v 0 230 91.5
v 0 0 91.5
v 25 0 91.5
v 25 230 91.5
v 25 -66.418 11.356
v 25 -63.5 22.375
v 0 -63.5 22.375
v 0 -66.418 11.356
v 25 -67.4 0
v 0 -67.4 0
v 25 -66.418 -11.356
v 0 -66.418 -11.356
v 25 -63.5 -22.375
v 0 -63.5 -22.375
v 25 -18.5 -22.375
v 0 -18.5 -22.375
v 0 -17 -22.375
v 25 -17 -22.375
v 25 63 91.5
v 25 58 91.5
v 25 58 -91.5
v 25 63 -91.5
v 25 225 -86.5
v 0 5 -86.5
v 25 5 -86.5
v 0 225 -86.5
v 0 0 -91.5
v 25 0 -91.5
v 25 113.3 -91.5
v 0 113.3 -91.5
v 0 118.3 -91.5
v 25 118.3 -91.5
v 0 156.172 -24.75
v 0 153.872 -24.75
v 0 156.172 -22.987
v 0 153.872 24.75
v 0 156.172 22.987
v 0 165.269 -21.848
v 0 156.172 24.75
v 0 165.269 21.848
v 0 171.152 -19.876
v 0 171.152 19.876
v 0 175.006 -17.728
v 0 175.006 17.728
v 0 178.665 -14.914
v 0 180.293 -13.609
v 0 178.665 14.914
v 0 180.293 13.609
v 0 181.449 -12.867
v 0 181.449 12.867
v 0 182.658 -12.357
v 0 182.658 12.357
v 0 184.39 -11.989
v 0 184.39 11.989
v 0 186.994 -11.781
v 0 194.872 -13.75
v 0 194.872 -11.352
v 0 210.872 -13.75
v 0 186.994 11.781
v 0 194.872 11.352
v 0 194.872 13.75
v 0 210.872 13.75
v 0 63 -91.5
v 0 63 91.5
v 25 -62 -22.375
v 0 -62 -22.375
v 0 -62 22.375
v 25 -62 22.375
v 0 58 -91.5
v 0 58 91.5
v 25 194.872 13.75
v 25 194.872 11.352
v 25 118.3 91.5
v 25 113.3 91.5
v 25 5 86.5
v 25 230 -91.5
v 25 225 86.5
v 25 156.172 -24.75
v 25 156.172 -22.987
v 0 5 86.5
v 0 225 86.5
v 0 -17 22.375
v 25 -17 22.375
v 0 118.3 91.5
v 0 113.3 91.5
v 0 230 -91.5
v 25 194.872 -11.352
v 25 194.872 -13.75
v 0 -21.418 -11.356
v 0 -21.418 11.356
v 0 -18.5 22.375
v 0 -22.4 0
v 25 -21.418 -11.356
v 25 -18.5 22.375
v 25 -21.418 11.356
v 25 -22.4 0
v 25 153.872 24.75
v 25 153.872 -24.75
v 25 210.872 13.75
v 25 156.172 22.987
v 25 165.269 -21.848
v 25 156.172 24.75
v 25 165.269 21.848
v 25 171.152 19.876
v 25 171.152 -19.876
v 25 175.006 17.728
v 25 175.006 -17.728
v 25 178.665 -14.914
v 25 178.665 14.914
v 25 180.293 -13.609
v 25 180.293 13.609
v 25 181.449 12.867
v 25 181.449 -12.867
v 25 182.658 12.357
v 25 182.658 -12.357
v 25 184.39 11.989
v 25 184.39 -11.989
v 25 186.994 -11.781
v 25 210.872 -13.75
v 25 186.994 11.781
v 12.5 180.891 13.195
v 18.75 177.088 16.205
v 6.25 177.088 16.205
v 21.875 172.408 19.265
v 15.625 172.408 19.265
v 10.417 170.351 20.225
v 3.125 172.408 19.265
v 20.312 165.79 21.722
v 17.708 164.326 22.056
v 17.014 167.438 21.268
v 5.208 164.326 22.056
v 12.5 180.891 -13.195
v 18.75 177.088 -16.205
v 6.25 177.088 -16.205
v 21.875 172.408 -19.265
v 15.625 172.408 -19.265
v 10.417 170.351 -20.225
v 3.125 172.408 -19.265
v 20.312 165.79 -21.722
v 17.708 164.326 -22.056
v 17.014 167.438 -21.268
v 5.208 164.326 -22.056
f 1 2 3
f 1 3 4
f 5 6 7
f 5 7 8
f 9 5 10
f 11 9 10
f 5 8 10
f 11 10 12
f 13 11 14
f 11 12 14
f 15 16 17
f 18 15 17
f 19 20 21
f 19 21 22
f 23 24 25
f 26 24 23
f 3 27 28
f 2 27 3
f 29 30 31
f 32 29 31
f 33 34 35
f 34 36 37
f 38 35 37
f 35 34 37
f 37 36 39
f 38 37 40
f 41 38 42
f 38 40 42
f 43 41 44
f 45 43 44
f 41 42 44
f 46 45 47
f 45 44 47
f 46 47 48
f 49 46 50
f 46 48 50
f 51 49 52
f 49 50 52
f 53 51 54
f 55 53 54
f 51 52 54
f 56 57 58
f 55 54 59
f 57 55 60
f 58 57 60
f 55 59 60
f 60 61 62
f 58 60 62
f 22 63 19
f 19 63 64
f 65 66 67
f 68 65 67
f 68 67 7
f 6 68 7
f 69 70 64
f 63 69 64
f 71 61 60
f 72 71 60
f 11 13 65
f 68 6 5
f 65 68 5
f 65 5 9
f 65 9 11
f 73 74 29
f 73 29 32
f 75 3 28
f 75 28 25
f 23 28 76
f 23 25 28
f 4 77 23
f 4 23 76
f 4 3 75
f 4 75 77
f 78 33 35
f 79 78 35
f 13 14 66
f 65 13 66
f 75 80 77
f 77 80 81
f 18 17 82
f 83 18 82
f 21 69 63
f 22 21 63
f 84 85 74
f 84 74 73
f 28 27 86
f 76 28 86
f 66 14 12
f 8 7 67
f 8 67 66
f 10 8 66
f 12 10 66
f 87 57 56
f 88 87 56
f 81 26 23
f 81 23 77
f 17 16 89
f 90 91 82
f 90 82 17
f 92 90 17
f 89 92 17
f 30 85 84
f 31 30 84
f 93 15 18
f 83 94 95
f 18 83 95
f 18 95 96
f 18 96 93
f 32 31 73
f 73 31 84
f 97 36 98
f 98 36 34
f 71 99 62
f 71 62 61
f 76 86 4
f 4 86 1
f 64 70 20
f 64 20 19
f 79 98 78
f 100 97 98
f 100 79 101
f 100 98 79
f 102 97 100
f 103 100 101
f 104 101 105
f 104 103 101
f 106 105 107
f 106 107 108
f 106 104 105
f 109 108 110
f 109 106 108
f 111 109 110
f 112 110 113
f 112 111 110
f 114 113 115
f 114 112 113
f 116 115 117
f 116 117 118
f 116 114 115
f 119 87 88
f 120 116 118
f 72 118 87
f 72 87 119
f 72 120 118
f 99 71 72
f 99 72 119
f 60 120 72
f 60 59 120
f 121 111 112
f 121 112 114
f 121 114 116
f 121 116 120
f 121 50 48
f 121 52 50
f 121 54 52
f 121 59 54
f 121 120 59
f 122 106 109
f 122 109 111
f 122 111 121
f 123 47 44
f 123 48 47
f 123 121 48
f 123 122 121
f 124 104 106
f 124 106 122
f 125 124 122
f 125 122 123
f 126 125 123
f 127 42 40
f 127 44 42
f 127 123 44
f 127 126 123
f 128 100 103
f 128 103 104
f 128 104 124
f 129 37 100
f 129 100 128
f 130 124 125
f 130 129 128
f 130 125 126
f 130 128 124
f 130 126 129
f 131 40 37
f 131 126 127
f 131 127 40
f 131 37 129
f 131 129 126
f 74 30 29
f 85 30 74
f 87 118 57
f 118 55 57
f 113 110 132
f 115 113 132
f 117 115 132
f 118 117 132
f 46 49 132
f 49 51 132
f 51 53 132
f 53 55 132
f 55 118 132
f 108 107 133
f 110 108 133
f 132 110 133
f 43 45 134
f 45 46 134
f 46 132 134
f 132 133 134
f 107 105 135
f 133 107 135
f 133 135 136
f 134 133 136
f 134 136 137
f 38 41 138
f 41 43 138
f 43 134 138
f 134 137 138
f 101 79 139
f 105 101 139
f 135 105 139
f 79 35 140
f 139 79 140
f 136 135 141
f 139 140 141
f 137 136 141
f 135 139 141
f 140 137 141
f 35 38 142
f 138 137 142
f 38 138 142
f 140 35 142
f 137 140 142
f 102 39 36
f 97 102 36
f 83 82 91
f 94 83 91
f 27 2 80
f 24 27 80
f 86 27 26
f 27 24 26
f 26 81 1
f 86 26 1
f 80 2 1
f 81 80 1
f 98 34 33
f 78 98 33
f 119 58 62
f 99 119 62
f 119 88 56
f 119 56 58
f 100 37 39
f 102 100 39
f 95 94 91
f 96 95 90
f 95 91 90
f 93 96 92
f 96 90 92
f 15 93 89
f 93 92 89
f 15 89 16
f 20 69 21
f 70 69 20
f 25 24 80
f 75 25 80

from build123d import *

# Parameters (mm, degrees)
F3_W     = 230
F3_H     = 183
F3_W_2   = 220
F3_H_2   = 173
F4_DEPTH = 25
F5_DEPTH = 25
F6_W     = 5
F6_H     = 183
F7_DEPTH = 25


# Not quite as in the source:
# - the dataset's text gives a spline's control points without its knots; the knots are read off the source's solid


with BuildPart() as f4:
    # F3 (on Right) → F4 (new body)
    with BuildSketch(Plane.YZ):
        with Locations((115, 0)):
            Rectangle(F3_W, F3_H)
        with Locations((115, 0)):
            Rectangle(F3_W_2, F3_H_2, mode=Mode.SUBTRACT)
    extrude(amount=F4_DEPTH)


with BuildPart() as f5:
    # F2 (on Right) → F5 (new body)
    with BuildSketch(Plane.YZ):
        with BuildLine():
            Line((210.8721694193, -13.75), (210.8721694193, 13.75))
            Line((210.8721694193, 13.75), (194.8721694193, 13.75))
            Line((194.8721694193, 13.75), (194.8721694193, 11.3520892337))
            add(Edge.make_bspline(
                [(156.1721694193, 22.9873415195), (172.6975398433, 22.3892458961), (180.3810074103, 10.6525710072), (185.9791283701, 12.0223834249), (194.8721694193, 11.3520892337)],
                knots=[0, 0, 0, 0, 0.5786049699, 1, 1, 1, 1], degree=3))
            Line((156.1721694193, 22.9873415195), (156.1721694193, 24.75))
            Line((156.1721694193, 24.75), (153.8721694193, 24.75))
            Line((153.8721694193, 24.75), (153.8721694193, -24.75))
            Line((153.8721694193, -24.75), (156.1721694193, -24.75))
            Line((156.1721694193, -24.75), (156.1721694193, -22.9873415195))
            add(Edge.make_bspline(
                [(156.1721694193, -22.9873415195), (172.6975398433, -22.3892458961), (180.3810074103, -10.6525710072), (185.9791283701, -12.0223834249), (194.8721694193, -11.3520892337)],
                knots=[0, 0, 0, 0, 0.5786049699, 1, 1, 1, 1], degree=3))
            Line((194.8721694193, -11.3520892337), (194.8721694193, -13.75))
            Line((194.8721694193, -13.75), (210.8721694193, -13.75))
        make_face()
    extrude(amount=F5_DEPTH)


with BuildPart() as f5b:
    # F2 (on Right) → F5, piece 2 (new body)
    with BuildSketch(Plane.YZ):
        with BuildLine():
            Line((-17, 22.375), (-18.5, 22.375))
            ThreePointArc((-18.5, 22.375), (-22.4, 0), (-18.5, -22.375))
            Line((-18.5, -22.375), (-17, -22.375))
            Line((-17, -22.375), (-17, 22.375))
        make_face()
    extrude(amount=F5_DEPTH)


with BuildPart() as f5c:
    # F2 (on Right) → F5, piece 3 (new body)
    with BuildSketch(Plane.YZ):
        with BuildLine():
            Line((-62, 22.375), (-63.5, 22.375))
            ThreePointArc((-63.5, 22.375), (-67.4, 0), (-63.5, -22.375))
            Line((-63.5, -22.375), (-62, -22.375))
            Line((-62, -22.375), (-62, 22.375))
        make_face()
    extrude(amount=F5_DEPTH)


with BuildPart() as f7:
    # F6 (on Right) → F7 (new body)
    with BuildSketch(Plane.YZ):
        with Locations((60.5, 0)):
            Rectangle(F6_W, F6_H)
    extrude(amount=F7_DEPTH)


with BuildPart() as f7b:
    # F6 (on Right) → F7, piece 2 (new body)
    with BuildSketch(Plane.YZ):
        with Locations((115.8, 0)):
            Rectangle(F6_W, F6_H)
    extrude(amount=F7_DEPTH)


solid = Compound([f4.part, f5.part, f5b.part, f5c.part, f7.part, f7b.part])
